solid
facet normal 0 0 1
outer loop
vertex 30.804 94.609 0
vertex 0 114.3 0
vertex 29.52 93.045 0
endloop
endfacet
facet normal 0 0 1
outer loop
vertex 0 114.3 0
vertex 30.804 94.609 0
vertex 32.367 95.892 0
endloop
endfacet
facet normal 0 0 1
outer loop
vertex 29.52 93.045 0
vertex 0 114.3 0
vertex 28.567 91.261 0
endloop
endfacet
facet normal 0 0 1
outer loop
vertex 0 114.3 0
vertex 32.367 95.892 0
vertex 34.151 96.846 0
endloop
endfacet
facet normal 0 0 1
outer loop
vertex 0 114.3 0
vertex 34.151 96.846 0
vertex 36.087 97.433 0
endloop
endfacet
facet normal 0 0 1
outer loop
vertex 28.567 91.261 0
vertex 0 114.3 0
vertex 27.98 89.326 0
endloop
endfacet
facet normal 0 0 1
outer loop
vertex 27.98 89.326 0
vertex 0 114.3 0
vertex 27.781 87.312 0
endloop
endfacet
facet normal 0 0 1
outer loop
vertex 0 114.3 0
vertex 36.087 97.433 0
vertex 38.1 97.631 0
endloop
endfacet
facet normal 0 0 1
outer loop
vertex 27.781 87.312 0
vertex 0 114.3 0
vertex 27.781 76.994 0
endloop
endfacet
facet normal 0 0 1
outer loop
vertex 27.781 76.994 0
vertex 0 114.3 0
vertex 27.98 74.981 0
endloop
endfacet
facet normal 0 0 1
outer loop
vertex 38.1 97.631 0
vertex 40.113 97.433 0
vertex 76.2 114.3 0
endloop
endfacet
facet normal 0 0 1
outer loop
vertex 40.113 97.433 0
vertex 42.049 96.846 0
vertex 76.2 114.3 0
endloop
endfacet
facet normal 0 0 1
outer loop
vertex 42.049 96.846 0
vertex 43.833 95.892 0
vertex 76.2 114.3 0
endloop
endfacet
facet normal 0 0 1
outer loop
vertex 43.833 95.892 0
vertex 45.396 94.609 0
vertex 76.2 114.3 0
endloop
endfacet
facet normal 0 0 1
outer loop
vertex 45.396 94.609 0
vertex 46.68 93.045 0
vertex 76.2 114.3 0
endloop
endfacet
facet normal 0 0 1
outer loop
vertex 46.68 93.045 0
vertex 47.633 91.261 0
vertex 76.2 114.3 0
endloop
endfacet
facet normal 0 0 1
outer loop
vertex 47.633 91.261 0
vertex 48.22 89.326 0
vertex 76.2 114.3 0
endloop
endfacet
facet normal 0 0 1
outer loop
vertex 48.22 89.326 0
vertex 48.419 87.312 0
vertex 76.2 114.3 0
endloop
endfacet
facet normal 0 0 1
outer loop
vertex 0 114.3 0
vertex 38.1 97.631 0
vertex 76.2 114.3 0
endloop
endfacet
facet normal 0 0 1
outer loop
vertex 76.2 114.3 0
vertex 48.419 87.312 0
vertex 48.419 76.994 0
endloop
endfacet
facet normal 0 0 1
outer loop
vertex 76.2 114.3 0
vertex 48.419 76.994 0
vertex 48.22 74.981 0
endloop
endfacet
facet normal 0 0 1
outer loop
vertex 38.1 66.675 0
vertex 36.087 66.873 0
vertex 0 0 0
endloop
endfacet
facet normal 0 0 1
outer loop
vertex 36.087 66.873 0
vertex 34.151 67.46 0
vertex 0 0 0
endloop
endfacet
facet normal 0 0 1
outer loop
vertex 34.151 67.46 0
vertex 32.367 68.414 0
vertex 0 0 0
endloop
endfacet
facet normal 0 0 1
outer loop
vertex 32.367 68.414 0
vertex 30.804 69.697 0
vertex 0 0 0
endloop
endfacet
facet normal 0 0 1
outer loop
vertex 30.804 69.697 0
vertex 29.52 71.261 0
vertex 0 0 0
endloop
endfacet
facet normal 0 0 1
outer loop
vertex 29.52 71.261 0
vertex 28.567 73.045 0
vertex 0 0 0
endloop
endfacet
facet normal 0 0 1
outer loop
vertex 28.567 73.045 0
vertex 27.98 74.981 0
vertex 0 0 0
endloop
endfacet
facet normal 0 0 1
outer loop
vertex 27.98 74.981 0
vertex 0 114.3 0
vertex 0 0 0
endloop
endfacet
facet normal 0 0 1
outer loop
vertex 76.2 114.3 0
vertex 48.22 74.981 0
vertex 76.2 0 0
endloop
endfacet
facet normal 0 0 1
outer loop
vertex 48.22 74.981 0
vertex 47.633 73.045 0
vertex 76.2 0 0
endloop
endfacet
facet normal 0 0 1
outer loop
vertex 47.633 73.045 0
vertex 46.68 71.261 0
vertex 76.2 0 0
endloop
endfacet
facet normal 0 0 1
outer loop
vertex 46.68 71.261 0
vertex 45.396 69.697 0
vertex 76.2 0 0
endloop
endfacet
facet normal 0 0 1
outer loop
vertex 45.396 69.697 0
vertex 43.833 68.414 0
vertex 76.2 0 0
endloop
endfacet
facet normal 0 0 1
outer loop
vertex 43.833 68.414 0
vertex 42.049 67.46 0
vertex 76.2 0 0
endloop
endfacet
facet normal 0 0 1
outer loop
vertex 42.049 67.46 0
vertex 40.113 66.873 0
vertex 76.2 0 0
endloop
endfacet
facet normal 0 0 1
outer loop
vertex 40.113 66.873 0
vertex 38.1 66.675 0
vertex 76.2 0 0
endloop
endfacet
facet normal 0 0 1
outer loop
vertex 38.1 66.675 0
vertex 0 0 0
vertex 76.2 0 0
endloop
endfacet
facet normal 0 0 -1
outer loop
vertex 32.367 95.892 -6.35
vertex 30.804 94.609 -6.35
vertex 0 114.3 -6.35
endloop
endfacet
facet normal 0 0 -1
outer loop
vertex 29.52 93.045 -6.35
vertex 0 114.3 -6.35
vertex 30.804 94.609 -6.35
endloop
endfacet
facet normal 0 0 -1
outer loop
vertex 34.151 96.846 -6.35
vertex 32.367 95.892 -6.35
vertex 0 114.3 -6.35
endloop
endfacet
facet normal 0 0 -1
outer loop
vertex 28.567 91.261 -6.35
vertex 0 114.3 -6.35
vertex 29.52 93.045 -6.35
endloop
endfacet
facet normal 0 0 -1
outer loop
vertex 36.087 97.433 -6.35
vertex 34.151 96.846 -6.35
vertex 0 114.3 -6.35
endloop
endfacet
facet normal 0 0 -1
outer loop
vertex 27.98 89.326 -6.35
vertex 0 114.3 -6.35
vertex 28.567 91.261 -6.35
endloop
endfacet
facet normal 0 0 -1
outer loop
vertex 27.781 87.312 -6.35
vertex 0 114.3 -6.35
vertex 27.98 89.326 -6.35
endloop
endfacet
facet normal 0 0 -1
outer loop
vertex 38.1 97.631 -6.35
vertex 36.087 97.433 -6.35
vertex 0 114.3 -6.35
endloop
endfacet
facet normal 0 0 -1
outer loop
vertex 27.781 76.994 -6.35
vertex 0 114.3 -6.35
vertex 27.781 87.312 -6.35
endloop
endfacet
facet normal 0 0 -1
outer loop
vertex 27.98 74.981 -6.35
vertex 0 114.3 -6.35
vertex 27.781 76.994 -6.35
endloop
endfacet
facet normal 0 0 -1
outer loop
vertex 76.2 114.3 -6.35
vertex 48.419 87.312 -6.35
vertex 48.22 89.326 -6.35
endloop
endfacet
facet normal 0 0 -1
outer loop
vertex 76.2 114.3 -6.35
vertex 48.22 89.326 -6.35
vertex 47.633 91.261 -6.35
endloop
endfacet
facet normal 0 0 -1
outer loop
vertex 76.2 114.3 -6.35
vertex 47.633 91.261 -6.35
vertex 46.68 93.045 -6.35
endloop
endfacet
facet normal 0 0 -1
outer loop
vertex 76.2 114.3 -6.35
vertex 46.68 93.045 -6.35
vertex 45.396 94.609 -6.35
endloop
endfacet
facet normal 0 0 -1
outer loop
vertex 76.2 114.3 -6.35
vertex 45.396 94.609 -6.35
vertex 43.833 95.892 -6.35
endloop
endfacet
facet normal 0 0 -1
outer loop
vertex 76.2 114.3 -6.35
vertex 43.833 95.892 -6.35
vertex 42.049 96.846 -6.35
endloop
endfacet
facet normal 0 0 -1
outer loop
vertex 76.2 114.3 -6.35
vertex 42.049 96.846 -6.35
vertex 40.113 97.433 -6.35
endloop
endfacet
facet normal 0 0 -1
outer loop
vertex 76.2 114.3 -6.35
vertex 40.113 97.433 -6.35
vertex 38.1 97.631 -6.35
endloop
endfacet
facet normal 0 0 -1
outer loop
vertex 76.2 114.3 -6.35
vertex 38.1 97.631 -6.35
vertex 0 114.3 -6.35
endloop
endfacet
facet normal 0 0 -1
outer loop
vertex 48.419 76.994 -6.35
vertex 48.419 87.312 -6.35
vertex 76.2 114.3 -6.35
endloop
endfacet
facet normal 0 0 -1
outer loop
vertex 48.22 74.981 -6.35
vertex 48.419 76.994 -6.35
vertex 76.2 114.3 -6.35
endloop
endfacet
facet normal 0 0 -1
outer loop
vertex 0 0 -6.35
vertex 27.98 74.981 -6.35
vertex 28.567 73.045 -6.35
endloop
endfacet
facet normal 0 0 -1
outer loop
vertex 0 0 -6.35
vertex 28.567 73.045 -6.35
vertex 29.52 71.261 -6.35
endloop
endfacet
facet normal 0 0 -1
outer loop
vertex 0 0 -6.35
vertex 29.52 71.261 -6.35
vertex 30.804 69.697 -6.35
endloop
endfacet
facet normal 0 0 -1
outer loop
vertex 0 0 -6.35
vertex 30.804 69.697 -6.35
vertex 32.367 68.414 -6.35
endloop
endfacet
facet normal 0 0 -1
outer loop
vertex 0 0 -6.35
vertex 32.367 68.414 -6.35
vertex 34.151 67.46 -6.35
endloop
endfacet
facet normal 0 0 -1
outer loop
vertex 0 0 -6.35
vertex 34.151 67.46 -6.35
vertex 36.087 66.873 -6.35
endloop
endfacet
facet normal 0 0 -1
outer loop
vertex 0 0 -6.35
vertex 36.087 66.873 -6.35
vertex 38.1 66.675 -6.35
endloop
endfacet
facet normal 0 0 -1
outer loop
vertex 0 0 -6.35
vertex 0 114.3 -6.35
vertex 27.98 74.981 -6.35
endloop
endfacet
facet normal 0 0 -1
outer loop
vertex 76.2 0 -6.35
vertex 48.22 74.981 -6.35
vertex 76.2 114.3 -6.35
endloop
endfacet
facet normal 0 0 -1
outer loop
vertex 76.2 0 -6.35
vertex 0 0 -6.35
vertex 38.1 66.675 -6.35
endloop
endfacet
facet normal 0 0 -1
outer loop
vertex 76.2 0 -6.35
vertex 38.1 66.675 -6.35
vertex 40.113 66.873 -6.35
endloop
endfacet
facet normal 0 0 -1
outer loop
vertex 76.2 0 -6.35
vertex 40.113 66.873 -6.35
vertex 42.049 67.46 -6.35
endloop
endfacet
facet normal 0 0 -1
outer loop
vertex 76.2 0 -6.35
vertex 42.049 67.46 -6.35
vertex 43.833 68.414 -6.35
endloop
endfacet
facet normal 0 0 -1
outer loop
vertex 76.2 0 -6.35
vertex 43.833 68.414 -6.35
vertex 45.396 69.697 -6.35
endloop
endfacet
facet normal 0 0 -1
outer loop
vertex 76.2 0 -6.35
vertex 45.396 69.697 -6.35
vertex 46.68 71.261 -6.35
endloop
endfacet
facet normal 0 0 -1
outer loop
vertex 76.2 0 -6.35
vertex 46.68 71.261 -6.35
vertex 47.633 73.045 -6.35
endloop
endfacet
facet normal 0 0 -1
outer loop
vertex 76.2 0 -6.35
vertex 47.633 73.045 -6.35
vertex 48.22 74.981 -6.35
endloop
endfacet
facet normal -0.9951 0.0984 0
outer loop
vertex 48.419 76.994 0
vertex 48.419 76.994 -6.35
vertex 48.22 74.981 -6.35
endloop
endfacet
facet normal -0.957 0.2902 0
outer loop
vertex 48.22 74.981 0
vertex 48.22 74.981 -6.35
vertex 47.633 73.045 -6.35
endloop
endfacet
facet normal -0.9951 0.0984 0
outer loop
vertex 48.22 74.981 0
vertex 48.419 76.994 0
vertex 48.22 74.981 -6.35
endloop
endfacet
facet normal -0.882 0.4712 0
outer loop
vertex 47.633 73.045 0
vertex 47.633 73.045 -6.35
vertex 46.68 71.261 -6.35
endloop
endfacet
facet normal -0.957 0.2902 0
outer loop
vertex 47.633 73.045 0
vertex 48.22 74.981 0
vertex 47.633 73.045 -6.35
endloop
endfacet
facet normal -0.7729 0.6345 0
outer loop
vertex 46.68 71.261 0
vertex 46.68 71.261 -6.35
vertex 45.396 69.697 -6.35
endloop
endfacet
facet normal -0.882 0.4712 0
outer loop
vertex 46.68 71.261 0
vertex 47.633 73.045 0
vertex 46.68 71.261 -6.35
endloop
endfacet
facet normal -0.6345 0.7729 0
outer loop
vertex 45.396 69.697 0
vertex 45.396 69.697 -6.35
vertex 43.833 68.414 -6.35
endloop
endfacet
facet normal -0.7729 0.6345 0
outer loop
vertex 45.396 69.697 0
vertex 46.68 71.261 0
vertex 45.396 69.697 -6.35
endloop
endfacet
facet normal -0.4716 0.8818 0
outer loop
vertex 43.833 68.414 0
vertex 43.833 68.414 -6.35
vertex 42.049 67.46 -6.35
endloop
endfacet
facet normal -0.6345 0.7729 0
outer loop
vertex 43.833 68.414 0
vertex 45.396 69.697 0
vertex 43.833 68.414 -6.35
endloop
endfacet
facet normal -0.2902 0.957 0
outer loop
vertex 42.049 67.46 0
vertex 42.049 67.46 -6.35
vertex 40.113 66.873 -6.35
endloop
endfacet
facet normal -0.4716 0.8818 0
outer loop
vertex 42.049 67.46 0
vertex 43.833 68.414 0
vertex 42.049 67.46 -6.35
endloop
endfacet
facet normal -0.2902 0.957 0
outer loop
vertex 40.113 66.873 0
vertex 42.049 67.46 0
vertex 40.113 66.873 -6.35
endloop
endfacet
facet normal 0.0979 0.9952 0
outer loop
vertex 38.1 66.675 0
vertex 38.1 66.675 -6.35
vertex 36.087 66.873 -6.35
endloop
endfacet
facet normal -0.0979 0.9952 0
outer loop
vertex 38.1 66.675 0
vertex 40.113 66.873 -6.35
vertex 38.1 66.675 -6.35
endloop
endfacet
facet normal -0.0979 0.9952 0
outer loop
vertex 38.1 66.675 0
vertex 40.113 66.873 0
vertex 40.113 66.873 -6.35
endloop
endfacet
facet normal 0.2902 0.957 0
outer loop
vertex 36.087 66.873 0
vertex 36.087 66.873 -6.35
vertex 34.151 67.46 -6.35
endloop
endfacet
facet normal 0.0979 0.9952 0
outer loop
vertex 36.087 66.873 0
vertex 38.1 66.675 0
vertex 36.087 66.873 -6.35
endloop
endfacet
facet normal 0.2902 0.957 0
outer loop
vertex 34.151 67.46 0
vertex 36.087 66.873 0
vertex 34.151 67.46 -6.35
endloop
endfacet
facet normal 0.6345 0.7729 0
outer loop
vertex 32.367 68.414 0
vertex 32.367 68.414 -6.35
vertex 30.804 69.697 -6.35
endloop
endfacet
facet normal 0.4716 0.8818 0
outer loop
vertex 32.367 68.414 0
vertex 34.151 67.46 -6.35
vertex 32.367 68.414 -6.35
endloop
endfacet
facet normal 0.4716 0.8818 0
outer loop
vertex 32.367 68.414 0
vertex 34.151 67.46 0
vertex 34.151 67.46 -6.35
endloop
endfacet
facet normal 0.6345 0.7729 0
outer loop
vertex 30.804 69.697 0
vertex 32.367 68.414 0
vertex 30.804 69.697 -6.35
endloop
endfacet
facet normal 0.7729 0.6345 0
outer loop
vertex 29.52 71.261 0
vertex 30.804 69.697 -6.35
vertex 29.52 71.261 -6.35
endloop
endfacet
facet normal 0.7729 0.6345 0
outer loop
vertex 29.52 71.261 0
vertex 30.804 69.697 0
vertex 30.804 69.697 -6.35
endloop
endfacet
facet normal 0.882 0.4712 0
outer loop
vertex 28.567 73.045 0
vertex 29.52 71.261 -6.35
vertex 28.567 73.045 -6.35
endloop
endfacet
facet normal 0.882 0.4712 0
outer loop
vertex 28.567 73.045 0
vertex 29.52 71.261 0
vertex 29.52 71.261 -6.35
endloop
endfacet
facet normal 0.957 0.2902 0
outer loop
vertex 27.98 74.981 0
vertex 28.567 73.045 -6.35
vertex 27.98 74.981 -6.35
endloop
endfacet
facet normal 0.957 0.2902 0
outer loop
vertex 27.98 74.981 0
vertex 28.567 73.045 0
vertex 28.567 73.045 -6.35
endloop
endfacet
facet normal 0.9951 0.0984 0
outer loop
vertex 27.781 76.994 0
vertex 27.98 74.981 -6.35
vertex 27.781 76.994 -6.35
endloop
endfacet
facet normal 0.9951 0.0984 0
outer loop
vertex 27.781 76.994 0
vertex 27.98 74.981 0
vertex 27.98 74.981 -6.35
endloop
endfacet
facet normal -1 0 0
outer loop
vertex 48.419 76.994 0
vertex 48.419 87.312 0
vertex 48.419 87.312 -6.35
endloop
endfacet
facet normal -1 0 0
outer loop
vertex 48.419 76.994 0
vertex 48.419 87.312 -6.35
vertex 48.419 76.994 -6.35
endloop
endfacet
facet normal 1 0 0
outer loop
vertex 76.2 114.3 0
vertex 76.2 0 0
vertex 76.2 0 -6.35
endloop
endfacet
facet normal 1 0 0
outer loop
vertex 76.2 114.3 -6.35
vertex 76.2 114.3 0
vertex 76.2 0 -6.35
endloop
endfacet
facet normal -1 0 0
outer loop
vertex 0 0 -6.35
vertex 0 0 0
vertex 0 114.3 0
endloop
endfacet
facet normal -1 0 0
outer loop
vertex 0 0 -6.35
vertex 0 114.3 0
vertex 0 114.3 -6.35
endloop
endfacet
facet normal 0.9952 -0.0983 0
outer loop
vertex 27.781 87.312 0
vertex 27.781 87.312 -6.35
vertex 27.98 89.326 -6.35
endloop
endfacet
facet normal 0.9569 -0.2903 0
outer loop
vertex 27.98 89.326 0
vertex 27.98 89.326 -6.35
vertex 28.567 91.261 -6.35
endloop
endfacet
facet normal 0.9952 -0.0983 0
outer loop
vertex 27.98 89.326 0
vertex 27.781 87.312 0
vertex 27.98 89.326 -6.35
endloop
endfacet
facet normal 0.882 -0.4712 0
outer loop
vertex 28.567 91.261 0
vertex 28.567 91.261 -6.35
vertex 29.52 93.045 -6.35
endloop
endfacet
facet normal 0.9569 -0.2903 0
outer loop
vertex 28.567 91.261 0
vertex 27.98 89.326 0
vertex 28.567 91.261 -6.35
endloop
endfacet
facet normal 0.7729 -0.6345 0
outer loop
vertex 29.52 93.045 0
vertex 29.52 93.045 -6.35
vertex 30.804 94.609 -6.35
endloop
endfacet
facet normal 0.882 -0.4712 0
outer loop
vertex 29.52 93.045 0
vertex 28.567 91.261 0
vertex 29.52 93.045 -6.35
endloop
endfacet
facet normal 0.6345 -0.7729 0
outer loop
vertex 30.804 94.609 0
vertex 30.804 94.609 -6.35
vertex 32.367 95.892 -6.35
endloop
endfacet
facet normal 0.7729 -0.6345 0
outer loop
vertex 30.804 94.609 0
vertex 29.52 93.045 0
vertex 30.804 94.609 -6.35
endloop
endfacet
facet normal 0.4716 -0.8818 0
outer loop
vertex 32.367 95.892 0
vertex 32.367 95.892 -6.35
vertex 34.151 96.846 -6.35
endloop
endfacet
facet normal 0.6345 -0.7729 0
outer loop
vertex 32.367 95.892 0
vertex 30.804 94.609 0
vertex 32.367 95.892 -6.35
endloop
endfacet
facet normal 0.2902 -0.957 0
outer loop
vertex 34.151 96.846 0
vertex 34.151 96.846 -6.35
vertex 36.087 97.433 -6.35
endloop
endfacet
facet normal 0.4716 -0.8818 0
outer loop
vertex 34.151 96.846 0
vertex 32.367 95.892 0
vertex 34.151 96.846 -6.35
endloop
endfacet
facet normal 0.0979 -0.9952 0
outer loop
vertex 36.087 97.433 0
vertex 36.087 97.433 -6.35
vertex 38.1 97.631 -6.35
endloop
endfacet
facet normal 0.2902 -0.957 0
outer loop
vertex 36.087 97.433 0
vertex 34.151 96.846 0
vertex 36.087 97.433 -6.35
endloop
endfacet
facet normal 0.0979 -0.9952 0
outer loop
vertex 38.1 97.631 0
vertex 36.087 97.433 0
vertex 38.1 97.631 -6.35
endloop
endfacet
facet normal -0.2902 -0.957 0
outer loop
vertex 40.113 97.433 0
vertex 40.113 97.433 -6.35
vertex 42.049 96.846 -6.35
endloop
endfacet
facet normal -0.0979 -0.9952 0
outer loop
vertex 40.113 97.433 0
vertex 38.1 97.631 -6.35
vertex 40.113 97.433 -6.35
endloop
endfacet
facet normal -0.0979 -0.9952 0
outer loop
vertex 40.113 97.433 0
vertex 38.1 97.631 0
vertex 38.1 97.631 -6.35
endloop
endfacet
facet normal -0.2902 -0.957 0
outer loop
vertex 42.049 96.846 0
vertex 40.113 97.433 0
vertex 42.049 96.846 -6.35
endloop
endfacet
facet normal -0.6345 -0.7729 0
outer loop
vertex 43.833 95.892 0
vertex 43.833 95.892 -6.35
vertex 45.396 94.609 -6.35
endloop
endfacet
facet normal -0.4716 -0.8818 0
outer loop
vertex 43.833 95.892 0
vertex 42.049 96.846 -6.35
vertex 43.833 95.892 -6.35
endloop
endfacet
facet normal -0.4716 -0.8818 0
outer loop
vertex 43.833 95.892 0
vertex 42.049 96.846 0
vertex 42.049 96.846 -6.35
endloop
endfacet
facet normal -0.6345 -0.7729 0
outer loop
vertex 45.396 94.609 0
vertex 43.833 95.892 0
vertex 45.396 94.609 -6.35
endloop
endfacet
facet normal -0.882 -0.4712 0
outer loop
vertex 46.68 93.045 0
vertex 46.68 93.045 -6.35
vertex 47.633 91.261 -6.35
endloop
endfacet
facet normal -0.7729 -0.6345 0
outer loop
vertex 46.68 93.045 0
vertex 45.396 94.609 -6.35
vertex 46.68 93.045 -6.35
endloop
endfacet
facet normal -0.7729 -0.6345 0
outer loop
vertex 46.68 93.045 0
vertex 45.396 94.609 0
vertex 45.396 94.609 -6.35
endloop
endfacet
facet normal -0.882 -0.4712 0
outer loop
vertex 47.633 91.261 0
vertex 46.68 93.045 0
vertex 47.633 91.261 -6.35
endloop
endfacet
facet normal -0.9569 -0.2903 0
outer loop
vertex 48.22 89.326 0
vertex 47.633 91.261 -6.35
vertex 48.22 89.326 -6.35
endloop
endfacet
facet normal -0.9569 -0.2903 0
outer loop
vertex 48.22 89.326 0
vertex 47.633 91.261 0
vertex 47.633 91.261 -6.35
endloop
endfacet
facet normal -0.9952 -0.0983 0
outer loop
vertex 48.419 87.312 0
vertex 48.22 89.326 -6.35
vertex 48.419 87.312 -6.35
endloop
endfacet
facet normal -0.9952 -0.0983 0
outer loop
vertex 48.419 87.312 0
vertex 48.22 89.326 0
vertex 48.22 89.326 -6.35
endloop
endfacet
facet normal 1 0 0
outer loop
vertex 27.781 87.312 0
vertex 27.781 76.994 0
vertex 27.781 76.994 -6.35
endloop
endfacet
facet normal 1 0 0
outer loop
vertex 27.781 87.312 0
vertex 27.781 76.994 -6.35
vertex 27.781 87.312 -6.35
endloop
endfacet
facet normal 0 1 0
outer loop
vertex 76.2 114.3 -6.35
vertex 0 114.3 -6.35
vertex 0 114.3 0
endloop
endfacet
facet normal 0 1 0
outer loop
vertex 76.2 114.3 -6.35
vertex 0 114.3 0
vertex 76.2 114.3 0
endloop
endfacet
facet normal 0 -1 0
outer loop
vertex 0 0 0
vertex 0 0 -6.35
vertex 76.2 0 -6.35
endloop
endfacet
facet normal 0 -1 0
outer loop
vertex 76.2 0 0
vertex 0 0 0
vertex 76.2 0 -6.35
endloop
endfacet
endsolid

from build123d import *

# Parameters (mm, degrees)
SKETCH1_W           = 76.2
SKETCH1_H           = 6.35
BOSS_EXTRUDE1_DEPTH = 114.3
CUT_EXTRUDE1_DEPTH  = 7.35


with BuildPart() as part:
    # Sketch1 → Boss-Extrude1 (new body)
    with BuildSketch(Plane(origin=(0, 0, 0), x_dir=(1, 0, 0), z_dir=(0, 1, 0))):
        with Locations((38.1, 3.175)):
            Rectangle(SKETCH1_W, SKETCH1_H)
    extrude(amount=BOSS_EXTRUDE1_DEPTH)

    # Sketch2 → Cut-Extrude1 (cut, through all)
    with BuildSketch(Plane.XY):
        with BuildLine():
            Line((48.41875, 87.3125), (48.41875, 76.99375))
            ThreePointArc((48.41875, 76.99375), (38.1, 66.675), (27.78125, 76.99375))
            Line((27.78125, 76.99375), (27.78125, 87.3125))
            ThreePointArc((27.78125, 87.3125), (38.1, 97.63125), (48.41875, 87.3125))
        make_face()
    extrude(amount=-CUT_EXTRUDE1_DEPTH, mode=Mode.SUBTRACT)


solid = part.part
